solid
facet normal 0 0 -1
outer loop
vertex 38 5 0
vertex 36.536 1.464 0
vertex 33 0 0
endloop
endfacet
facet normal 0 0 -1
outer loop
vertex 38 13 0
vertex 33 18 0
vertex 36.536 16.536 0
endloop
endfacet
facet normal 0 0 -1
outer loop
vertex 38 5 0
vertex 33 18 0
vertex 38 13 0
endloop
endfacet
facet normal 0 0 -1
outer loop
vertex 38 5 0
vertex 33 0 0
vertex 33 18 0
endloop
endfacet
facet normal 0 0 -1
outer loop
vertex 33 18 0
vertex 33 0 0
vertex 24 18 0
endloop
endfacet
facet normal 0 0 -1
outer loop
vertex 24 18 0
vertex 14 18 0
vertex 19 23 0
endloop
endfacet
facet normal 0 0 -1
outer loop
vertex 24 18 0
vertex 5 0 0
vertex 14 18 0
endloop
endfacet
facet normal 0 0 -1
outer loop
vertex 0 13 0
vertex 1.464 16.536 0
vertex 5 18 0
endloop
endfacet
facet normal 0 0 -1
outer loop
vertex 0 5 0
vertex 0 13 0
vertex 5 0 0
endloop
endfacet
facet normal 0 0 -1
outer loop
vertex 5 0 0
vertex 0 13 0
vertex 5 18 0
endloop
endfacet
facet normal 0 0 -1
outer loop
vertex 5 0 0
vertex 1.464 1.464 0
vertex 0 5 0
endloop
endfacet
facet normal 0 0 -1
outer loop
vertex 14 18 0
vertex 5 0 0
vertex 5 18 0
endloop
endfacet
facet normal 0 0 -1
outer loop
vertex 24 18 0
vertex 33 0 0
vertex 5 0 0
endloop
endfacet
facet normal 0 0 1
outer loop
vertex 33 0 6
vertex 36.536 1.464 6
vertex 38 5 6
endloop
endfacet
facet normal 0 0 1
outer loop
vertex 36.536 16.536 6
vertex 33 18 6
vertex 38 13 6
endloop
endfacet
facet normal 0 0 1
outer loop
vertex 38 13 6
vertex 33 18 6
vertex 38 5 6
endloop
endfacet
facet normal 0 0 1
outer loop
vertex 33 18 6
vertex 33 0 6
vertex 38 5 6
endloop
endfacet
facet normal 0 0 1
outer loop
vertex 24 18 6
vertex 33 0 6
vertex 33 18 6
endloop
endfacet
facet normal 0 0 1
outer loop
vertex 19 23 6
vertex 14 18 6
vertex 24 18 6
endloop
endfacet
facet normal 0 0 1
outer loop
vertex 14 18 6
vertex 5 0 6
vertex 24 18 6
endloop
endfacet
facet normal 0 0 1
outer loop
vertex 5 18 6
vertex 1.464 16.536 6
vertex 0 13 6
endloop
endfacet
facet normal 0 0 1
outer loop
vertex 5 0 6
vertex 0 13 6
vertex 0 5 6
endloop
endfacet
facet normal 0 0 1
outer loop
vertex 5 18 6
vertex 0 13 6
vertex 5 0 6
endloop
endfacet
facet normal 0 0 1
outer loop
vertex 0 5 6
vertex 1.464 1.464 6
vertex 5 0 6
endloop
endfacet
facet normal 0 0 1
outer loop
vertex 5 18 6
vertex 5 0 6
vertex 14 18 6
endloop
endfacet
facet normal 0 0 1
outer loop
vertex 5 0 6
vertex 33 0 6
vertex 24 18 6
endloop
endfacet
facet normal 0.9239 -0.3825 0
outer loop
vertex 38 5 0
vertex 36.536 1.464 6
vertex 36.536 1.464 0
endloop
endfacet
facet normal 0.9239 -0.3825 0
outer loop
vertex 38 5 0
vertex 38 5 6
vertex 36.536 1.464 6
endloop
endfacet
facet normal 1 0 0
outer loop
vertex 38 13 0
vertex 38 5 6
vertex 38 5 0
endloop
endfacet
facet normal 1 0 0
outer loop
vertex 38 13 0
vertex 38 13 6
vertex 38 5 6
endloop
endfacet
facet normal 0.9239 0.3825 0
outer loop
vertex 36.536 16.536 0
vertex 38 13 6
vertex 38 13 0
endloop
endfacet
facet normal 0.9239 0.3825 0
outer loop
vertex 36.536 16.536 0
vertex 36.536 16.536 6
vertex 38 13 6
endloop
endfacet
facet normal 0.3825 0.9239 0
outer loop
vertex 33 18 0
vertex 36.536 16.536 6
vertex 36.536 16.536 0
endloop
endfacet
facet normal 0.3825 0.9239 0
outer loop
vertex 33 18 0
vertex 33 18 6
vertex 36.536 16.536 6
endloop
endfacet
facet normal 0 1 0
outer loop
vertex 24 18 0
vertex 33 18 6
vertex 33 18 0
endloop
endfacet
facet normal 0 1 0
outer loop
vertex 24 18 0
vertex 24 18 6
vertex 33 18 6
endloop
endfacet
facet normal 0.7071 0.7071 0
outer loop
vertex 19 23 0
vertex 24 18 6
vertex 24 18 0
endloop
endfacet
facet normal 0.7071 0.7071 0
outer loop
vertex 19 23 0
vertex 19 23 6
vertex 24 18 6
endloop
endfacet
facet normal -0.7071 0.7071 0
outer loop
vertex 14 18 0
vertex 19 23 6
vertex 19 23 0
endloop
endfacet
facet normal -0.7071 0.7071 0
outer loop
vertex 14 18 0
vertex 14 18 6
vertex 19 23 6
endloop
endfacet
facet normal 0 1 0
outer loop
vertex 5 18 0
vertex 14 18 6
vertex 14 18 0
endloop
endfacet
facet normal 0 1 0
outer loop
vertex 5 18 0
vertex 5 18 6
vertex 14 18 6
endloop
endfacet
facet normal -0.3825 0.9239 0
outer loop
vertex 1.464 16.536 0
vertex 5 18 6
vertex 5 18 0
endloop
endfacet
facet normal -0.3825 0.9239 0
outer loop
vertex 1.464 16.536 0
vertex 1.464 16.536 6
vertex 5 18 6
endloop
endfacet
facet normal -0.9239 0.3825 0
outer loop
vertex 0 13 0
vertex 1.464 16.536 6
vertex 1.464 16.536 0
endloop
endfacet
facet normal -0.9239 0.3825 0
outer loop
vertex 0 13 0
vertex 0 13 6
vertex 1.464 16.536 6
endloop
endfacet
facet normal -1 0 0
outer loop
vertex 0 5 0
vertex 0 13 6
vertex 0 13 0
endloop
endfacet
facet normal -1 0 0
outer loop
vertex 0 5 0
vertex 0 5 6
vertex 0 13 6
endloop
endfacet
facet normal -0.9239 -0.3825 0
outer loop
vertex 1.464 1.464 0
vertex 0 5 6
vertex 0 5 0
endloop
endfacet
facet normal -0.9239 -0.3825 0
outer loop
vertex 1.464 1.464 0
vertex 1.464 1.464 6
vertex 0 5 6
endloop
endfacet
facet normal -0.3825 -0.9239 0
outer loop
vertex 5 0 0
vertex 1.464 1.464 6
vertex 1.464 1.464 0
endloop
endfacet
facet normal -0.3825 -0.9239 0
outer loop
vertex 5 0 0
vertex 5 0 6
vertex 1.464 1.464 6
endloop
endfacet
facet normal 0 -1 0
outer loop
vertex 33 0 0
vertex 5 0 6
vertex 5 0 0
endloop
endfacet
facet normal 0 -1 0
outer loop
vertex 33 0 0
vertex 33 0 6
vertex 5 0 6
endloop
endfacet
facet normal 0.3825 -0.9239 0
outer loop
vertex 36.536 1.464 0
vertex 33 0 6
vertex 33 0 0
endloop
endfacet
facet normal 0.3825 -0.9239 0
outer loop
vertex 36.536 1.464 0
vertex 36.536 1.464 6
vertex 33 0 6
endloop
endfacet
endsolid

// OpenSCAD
$fn = 32;

// ----------------------------------------------------------------------
// Ratchet pawl: 38 x 18 mm body, beak 5 mm сверху
// ----------------------------------------------------------------------

// --- parameters (mm) ---
profile_height = 6;       // extrusion height
profile_points = 15;      // points of the closed outline

profile = [[0, 5], [1.464, 1.464], [5, 0], [33, 0], [36.536, 1.464], [38, 5], [38, 13], [36.536, 16.536], [33, 18], [24, 18], [19, 23], [14, 18], [5, 18], [1.464, 16.536], [0, 13]];  // single closed polygon, 15 points, counter clockwise

// --- the one profile operation ---
linear_extrude(height = profile_height) polygon(points = profile);
